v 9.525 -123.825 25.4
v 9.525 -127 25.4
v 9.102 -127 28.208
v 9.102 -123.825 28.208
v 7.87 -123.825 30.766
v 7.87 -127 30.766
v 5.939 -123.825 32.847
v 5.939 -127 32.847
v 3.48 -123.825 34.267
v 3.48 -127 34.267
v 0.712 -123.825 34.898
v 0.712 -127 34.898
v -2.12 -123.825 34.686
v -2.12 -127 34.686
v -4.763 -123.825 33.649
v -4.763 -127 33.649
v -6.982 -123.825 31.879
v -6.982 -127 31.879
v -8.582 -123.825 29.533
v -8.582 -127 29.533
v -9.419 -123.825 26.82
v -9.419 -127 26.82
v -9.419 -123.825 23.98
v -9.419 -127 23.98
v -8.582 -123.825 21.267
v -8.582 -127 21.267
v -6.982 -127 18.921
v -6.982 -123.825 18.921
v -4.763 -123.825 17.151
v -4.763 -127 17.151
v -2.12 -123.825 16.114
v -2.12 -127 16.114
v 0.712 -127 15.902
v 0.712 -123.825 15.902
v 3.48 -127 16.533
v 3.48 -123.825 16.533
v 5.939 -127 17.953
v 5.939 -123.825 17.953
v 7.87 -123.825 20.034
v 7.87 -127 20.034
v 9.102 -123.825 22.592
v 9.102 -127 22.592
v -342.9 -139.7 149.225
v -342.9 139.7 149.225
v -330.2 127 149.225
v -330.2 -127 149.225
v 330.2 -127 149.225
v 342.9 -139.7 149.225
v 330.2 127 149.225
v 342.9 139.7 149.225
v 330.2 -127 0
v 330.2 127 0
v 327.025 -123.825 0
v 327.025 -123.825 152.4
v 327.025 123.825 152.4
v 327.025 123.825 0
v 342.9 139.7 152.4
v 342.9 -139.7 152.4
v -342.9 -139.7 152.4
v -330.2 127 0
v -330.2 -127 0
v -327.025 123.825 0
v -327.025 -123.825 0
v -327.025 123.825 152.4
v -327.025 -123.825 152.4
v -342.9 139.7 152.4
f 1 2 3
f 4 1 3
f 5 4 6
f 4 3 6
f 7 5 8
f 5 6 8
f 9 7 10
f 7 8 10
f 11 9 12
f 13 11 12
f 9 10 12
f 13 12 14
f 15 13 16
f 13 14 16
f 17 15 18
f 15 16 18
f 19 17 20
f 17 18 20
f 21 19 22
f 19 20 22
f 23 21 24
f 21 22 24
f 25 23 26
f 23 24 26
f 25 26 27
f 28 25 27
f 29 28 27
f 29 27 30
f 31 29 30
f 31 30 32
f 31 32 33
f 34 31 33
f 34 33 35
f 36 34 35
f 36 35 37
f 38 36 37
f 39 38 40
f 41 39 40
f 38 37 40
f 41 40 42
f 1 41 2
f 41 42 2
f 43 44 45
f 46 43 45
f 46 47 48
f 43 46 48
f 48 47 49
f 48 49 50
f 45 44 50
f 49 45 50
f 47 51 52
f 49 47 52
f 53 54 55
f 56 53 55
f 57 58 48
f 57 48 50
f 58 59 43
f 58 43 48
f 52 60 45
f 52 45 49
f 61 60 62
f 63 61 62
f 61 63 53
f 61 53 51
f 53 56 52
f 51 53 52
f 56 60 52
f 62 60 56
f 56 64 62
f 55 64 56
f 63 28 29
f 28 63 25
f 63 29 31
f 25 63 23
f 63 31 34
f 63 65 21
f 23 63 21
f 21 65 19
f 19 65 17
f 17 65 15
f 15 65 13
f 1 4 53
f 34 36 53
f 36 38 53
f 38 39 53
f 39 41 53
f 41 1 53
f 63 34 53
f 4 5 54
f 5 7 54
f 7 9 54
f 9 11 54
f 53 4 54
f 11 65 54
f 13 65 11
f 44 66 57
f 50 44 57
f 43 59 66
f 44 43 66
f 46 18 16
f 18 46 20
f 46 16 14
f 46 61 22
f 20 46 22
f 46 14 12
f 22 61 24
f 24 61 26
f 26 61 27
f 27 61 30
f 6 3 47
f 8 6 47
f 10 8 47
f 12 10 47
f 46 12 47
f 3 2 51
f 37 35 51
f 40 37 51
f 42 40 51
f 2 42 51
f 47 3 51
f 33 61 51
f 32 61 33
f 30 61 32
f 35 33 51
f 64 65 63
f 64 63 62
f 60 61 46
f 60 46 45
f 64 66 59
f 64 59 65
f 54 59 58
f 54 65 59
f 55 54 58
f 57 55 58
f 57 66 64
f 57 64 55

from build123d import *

# Parameters (mm, degrees)
F0_W     = 660.4
F0_H     = 254
F1_DEPTH = 152.4
F2_W     = 654.05
F2_H     = 247.65
F3_DEPTH = 152.401
F4_W     = 685.8
F4_H     = 279.4
F4_W_2   = 660.4
F4_H_2   = 254
F5_DEPTH = 3.175
F6_R     = 9.525
F7_DEPTH = 3.175


with BuildPart() as f1:
    # F0 (on Top) → F1 (new body)
    with BuildSketch(Plane.XY):
        Rectangle(F0_W, F0_H)
    extrude(amount=F1_DEPTH)

    # F2 (on face) → F3 (cut, through all)
    with BuildSketch(Plane.XY.offset(152.4)):
        Rectangle(F2_W, F2_H)
    extrude(amount=-F3_DEPTH, mode=Mode.SUBTRACT)

    # F4 (on face) → F5 (join)
    with BuildSketch(Plane.XY.offset(152.4)):
        Rectangle(F4_W, F4_H)
        Rectangle(F4_W_2, F4_H_2, mode=Mode.SUBTRACT)
    extrude(amount=-F5_DEPTH)

    # F6 (on face) → F7 (cut, through all)
    with BuildSketch(Plane.XZ.offset(127)):
        with Locations((0, 25.4)):
            Circle(F6_R)
    extrude(amount=-F7_DEPTH, mode=Mode.SUBTRACT)


solid = f1.part
